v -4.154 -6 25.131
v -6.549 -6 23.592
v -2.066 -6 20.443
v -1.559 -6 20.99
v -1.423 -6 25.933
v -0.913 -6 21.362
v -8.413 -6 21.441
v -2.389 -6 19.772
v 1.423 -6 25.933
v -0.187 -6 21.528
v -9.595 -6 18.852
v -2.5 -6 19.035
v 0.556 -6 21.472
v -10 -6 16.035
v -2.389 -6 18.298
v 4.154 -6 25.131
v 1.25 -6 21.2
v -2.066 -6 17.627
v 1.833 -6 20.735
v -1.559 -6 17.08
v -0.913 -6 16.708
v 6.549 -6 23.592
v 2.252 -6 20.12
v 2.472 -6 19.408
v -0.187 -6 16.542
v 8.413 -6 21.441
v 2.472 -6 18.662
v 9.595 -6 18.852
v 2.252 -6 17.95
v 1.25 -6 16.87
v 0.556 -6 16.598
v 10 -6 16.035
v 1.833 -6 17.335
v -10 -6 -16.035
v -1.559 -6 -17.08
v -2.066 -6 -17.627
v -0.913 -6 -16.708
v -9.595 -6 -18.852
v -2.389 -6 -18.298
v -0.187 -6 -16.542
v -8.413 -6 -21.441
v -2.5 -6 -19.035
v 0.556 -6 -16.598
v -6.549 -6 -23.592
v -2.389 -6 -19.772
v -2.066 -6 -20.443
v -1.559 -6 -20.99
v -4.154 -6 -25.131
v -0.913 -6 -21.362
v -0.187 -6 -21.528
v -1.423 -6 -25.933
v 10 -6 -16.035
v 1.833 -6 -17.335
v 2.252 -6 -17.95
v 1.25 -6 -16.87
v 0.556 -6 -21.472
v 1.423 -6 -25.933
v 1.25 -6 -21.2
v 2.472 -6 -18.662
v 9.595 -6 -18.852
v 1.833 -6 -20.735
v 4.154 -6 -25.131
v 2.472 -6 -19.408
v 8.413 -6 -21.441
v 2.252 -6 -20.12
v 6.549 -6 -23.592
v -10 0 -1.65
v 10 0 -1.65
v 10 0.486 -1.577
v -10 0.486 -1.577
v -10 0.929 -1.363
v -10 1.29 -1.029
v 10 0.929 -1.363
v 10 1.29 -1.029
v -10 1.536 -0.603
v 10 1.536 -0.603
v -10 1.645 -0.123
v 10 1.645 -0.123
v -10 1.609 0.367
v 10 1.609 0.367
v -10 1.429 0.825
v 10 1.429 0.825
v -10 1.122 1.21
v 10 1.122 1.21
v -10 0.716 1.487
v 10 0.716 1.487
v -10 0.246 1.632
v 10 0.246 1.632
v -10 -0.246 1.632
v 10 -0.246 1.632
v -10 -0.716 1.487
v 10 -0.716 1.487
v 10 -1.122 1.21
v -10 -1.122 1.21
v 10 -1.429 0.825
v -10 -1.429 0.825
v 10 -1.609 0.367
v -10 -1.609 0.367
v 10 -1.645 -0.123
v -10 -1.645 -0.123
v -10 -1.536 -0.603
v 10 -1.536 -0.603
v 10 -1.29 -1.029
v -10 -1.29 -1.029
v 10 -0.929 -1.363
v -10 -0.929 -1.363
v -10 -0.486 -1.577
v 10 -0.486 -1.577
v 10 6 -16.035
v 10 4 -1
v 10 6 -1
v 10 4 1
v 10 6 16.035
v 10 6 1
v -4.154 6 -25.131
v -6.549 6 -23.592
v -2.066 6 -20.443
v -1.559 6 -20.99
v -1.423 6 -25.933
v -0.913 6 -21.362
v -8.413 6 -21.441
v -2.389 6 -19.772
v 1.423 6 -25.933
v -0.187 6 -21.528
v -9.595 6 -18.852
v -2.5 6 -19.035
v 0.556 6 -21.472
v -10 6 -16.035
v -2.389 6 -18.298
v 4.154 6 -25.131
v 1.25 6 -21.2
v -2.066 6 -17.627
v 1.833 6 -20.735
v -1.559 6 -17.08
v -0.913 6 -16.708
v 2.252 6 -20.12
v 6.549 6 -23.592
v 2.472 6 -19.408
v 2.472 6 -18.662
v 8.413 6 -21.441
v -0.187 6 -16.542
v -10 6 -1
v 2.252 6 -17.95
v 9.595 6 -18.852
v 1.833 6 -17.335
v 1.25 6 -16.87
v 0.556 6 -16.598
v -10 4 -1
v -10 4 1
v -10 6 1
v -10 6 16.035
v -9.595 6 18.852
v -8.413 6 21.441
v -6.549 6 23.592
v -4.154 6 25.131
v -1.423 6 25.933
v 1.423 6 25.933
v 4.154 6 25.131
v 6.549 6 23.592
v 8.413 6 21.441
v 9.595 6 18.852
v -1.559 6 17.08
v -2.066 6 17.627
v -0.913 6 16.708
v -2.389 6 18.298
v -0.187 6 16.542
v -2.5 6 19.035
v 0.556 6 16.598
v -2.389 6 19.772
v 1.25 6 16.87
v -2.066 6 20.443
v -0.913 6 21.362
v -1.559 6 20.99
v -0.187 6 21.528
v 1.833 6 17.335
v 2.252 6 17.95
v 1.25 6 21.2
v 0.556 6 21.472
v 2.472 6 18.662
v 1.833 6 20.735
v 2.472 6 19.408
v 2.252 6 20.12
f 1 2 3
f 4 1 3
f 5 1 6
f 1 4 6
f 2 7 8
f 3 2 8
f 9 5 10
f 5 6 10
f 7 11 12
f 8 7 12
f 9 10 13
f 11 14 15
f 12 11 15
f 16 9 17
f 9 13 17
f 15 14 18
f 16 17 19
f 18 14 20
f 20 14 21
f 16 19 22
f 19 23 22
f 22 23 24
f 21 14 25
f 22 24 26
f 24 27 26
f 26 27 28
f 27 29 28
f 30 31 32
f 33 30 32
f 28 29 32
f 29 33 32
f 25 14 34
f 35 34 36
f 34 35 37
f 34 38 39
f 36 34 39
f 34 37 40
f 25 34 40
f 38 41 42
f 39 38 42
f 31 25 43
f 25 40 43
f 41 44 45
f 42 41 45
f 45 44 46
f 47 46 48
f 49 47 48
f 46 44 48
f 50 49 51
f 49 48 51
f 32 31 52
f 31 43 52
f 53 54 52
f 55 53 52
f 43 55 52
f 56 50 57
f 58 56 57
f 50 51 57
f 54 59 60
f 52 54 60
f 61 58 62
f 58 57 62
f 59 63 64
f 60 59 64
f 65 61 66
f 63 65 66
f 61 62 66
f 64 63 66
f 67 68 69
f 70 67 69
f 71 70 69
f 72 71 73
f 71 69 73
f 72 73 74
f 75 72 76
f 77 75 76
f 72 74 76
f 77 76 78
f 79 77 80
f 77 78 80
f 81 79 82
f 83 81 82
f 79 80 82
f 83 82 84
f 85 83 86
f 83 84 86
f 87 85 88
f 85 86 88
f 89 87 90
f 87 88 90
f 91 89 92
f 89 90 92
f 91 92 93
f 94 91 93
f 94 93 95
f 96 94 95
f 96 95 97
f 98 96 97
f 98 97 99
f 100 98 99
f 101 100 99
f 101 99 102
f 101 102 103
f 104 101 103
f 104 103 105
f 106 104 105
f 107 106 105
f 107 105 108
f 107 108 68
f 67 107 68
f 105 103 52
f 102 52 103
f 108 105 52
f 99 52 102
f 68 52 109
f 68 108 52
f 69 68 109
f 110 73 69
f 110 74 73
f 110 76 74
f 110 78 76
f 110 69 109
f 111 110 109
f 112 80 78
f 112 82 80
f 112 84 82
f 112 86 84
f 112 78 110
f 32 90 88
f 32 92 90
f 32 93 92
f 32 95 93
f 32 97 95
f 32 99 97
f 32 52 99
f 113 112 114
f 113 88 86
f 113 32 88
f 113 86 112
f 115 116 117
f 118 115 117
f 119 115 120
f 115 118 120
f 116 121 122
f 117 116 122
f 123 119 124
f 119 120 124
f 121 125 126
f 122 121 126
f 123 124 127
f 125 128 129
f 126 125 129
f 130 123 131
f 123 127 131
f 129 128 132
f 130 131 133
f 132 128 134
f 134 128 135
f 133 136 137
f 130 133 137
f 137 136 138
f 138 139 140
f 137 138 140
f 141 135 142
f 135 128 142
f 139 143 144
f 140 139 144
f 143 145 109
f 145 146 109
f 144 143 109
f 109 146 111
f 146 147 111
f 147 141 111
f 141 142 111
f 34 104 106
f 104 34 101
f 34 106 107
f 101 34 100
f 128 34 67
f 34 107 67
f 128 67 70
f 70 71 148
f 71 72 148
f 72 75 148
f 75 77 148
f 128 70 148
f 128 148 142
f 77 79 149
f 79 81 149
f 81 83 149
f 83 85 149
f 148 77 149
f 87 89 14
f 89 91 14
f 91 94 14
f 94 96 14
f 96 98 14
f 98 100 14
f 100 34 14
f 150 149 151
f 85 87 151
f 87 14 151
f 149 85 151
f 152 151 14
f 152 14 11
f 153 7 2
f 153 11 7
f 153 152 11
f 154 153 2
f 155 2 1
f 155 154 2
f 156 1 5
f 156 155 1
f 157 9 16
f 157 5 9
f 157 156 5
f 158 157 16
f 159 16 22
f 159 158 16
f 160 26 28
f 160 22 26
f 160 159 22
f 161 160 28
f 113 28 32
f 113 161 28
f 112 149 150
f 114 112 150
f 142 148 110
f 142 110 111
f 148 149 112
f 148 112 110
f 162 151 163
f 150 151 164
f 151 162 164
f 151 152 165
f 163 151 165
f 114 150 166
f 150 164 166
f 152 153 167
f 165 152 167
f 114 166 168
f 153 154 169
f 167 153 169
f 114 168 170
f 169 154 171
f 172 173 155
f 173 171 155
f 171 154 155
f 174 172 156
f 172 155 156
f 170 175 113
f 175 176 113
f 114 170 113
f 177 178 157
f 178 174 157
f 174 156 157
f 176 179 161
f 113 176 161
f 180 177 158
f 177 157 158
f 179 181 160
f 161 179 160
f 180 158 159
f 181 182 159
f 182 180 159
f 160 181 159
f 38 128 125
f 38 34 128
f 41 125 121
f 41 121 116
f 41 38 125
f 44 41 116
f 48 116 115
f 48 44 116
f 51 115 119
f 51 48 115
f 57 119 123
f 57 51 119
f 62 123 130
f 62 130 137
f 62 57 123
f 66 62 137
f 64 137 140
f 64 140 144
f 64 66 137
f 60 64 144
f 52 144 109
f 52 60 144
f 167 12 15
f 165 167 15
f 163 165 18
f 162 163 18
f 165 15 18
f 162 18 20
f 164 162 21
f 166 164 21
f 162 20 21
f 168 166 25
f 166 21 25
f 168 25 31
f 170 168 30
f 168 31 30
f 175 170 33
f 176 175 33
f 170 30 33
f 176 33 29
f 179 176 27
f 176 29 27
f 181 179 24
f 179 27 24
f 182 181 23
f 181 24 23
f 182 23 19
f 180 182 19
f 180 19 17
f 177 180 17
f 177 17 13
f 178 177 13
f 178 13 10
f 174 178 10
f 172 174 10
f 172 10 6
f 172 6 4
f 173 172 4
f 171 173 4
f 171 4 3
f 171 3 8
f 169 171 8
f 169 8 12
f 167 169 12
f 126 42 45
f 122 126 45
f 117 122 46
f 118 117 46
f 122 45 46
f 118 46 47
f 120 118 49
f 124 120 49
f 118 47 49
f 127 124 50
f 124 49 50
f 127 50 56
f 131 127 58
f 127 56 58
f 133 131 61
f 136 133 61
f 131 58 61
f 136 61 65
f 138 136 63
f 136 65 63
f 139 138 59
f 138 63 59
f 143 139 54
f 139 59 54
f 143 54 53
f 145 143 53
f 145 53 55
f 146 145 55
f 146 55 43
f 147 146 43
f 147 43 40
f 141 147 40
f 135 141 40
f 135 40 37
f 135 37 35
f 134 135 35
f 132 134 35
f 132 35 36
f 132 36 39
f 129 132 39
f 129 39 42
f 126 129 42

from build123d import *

# Parameters (mm, degrees)
SKETCH1_W               = 20
SKETCH1_H               = 12
BOSS_EXTRUDE1_DEPTH     = 26.035
M6X1_0_TAPPED_HOLE1_D   = 5
DELETEFACE1_START       = -6
DELETEFACE1_OUTLINE_R   = 2.5
DELETEFACE1_DEPTH       = 12
CUT_EXTRUDE1_DEPTH      = 29.527552033
CUT_EXTRUDE1_DEPTH_BACK = 29.527552033
SKETCH4_W               = 2
SKETCH4_H               = 2
M4X0_7_TAPPED_HOLE1_D   = 3.3
FILLET1_RADIUS          = 10
FILLET1_LENGTH          = 12
FILLET2_RADIUS          = 10
FILLET2_LENGTH          = 12


# Read off the part's stored shape, not the designer's step: DeleteFace1
with BuildPart() as part:
    # Sketch1 → Boss-Extrude1 (new, symmetric)
    with BuildSketch(Plane.XY):
        Rectangle(SKETCH1_W, SKETCH1_H)
    extrude(amount=BOSS_EXTRUDE1_DEPTH, both=True)

    # M6x1.0 Tapped Hole1 (through all)
    with Locations(Plane(origin=(0, 6, 0), x_dir=(1, 0, 0), z_dir=(0, 1, 0))):
        with Locations((0, -19.035), (0, 0), (0, 19.035)):
            Hole(M6X1_0_TAPPED_HOLE1_D / 2)

    # DeleteFace1 outline → DeleteFace1 (add)
    with BuildSketch(Plane(origin=(0, 0, 0), x_dir=(1, 0, 0), z_dir=(0, 1, 0)).offset(DELETEFACE1_START)):
        Circle(DELETEFACE1_OUTLINE_R)
    extrude(amount=DELETEFACE1_DEPTH)

    # Sketch4 → Cut-Extrude1 (cut, two sides: drawn at the far end of the back side and taken through both)
    with BuildSketch(Plane(origin=(0, 0, 0), x_dir=(0, 0, -1), z_dir=(1, 0, 0)).offset(-CUT_EXTRUDE1_DEPTH_BACK)):
        with Locations((0, 5)):
            Rectangle(SKETCH4_W, SKETCH4_H)
    extrude(amount=CUT_EXTRUDE1_DEPTH + CUT_EXTRUDE1_DEPTH_BACK, mode=Mode.SUBTRACT)

    # M4x0.7 Tapped Hole1 (through all)
    with Locations(Plane.ZY.offset(10)):
        with Locations((0, 0)):
            Hole(M4X0_7_TAPPED_HOLE1_D / 2)

    # Fillet1: full round fillet: the end face becomes a half cylinder, R = half its width
    fillet1_face = Plane((0, 0, -26.035), x_dir=(0, -1, 0), z_dir=(0, 0, -1))  # on the end face: x along it, z out of the body
    fillet1_slab = fillet1_face.offset(-FILLET1_RADIUS / 2) * Box(FILLET1_LENGTH, 2 * FILLET1_RADIUS, FILLET1_RADIUS, mode=Mode.PRIVATE)  # the body's end, R deep
    fillet1_round = Plane((0, 0, -16.035), x_dir=(0, 0, -1), z_dir=(0, -1, 0)) * Cylinder(FILLET1_RADIUS, FILLET1_LENGTH, mode=Mode.PRIVATE)  # its axis R under the face
    add(fillet1_slab - fillet1_round, mode=Mode.SUBTRACT)

    # Fillet2: full round fillet: the end face becomes a half cylinder, R = half its width
    fillet2_face = Plane((0, 0, 26.035), x_dir=(0, 1, 0), z_dir=(0, 0, 1))  # on the end face: x along it, z out of the body
    fillet2_slab = fillet2_face.offset(-FILLET2_RADIUS / 2) * Box(FILLET2_LENGTH, 2 * FILLET2_RADIUS, FILLET2_RADIUS, mode=Mode.PRIVATE)  # the body's end, R deep
    fillet2_round = Plane((0, 0, 16.035), x_dir=(0, 0, 1), z_dir=(0, 1, 0)) * Cylinder(FILLET2_RADIUS, FILLET2_LENGTH, mode=Mode.PRIVATE)  # its axis R under the face
    add(fillet2_slab - fillet2_round, mode=Mode.SUBTRACT)


solid = part.part
